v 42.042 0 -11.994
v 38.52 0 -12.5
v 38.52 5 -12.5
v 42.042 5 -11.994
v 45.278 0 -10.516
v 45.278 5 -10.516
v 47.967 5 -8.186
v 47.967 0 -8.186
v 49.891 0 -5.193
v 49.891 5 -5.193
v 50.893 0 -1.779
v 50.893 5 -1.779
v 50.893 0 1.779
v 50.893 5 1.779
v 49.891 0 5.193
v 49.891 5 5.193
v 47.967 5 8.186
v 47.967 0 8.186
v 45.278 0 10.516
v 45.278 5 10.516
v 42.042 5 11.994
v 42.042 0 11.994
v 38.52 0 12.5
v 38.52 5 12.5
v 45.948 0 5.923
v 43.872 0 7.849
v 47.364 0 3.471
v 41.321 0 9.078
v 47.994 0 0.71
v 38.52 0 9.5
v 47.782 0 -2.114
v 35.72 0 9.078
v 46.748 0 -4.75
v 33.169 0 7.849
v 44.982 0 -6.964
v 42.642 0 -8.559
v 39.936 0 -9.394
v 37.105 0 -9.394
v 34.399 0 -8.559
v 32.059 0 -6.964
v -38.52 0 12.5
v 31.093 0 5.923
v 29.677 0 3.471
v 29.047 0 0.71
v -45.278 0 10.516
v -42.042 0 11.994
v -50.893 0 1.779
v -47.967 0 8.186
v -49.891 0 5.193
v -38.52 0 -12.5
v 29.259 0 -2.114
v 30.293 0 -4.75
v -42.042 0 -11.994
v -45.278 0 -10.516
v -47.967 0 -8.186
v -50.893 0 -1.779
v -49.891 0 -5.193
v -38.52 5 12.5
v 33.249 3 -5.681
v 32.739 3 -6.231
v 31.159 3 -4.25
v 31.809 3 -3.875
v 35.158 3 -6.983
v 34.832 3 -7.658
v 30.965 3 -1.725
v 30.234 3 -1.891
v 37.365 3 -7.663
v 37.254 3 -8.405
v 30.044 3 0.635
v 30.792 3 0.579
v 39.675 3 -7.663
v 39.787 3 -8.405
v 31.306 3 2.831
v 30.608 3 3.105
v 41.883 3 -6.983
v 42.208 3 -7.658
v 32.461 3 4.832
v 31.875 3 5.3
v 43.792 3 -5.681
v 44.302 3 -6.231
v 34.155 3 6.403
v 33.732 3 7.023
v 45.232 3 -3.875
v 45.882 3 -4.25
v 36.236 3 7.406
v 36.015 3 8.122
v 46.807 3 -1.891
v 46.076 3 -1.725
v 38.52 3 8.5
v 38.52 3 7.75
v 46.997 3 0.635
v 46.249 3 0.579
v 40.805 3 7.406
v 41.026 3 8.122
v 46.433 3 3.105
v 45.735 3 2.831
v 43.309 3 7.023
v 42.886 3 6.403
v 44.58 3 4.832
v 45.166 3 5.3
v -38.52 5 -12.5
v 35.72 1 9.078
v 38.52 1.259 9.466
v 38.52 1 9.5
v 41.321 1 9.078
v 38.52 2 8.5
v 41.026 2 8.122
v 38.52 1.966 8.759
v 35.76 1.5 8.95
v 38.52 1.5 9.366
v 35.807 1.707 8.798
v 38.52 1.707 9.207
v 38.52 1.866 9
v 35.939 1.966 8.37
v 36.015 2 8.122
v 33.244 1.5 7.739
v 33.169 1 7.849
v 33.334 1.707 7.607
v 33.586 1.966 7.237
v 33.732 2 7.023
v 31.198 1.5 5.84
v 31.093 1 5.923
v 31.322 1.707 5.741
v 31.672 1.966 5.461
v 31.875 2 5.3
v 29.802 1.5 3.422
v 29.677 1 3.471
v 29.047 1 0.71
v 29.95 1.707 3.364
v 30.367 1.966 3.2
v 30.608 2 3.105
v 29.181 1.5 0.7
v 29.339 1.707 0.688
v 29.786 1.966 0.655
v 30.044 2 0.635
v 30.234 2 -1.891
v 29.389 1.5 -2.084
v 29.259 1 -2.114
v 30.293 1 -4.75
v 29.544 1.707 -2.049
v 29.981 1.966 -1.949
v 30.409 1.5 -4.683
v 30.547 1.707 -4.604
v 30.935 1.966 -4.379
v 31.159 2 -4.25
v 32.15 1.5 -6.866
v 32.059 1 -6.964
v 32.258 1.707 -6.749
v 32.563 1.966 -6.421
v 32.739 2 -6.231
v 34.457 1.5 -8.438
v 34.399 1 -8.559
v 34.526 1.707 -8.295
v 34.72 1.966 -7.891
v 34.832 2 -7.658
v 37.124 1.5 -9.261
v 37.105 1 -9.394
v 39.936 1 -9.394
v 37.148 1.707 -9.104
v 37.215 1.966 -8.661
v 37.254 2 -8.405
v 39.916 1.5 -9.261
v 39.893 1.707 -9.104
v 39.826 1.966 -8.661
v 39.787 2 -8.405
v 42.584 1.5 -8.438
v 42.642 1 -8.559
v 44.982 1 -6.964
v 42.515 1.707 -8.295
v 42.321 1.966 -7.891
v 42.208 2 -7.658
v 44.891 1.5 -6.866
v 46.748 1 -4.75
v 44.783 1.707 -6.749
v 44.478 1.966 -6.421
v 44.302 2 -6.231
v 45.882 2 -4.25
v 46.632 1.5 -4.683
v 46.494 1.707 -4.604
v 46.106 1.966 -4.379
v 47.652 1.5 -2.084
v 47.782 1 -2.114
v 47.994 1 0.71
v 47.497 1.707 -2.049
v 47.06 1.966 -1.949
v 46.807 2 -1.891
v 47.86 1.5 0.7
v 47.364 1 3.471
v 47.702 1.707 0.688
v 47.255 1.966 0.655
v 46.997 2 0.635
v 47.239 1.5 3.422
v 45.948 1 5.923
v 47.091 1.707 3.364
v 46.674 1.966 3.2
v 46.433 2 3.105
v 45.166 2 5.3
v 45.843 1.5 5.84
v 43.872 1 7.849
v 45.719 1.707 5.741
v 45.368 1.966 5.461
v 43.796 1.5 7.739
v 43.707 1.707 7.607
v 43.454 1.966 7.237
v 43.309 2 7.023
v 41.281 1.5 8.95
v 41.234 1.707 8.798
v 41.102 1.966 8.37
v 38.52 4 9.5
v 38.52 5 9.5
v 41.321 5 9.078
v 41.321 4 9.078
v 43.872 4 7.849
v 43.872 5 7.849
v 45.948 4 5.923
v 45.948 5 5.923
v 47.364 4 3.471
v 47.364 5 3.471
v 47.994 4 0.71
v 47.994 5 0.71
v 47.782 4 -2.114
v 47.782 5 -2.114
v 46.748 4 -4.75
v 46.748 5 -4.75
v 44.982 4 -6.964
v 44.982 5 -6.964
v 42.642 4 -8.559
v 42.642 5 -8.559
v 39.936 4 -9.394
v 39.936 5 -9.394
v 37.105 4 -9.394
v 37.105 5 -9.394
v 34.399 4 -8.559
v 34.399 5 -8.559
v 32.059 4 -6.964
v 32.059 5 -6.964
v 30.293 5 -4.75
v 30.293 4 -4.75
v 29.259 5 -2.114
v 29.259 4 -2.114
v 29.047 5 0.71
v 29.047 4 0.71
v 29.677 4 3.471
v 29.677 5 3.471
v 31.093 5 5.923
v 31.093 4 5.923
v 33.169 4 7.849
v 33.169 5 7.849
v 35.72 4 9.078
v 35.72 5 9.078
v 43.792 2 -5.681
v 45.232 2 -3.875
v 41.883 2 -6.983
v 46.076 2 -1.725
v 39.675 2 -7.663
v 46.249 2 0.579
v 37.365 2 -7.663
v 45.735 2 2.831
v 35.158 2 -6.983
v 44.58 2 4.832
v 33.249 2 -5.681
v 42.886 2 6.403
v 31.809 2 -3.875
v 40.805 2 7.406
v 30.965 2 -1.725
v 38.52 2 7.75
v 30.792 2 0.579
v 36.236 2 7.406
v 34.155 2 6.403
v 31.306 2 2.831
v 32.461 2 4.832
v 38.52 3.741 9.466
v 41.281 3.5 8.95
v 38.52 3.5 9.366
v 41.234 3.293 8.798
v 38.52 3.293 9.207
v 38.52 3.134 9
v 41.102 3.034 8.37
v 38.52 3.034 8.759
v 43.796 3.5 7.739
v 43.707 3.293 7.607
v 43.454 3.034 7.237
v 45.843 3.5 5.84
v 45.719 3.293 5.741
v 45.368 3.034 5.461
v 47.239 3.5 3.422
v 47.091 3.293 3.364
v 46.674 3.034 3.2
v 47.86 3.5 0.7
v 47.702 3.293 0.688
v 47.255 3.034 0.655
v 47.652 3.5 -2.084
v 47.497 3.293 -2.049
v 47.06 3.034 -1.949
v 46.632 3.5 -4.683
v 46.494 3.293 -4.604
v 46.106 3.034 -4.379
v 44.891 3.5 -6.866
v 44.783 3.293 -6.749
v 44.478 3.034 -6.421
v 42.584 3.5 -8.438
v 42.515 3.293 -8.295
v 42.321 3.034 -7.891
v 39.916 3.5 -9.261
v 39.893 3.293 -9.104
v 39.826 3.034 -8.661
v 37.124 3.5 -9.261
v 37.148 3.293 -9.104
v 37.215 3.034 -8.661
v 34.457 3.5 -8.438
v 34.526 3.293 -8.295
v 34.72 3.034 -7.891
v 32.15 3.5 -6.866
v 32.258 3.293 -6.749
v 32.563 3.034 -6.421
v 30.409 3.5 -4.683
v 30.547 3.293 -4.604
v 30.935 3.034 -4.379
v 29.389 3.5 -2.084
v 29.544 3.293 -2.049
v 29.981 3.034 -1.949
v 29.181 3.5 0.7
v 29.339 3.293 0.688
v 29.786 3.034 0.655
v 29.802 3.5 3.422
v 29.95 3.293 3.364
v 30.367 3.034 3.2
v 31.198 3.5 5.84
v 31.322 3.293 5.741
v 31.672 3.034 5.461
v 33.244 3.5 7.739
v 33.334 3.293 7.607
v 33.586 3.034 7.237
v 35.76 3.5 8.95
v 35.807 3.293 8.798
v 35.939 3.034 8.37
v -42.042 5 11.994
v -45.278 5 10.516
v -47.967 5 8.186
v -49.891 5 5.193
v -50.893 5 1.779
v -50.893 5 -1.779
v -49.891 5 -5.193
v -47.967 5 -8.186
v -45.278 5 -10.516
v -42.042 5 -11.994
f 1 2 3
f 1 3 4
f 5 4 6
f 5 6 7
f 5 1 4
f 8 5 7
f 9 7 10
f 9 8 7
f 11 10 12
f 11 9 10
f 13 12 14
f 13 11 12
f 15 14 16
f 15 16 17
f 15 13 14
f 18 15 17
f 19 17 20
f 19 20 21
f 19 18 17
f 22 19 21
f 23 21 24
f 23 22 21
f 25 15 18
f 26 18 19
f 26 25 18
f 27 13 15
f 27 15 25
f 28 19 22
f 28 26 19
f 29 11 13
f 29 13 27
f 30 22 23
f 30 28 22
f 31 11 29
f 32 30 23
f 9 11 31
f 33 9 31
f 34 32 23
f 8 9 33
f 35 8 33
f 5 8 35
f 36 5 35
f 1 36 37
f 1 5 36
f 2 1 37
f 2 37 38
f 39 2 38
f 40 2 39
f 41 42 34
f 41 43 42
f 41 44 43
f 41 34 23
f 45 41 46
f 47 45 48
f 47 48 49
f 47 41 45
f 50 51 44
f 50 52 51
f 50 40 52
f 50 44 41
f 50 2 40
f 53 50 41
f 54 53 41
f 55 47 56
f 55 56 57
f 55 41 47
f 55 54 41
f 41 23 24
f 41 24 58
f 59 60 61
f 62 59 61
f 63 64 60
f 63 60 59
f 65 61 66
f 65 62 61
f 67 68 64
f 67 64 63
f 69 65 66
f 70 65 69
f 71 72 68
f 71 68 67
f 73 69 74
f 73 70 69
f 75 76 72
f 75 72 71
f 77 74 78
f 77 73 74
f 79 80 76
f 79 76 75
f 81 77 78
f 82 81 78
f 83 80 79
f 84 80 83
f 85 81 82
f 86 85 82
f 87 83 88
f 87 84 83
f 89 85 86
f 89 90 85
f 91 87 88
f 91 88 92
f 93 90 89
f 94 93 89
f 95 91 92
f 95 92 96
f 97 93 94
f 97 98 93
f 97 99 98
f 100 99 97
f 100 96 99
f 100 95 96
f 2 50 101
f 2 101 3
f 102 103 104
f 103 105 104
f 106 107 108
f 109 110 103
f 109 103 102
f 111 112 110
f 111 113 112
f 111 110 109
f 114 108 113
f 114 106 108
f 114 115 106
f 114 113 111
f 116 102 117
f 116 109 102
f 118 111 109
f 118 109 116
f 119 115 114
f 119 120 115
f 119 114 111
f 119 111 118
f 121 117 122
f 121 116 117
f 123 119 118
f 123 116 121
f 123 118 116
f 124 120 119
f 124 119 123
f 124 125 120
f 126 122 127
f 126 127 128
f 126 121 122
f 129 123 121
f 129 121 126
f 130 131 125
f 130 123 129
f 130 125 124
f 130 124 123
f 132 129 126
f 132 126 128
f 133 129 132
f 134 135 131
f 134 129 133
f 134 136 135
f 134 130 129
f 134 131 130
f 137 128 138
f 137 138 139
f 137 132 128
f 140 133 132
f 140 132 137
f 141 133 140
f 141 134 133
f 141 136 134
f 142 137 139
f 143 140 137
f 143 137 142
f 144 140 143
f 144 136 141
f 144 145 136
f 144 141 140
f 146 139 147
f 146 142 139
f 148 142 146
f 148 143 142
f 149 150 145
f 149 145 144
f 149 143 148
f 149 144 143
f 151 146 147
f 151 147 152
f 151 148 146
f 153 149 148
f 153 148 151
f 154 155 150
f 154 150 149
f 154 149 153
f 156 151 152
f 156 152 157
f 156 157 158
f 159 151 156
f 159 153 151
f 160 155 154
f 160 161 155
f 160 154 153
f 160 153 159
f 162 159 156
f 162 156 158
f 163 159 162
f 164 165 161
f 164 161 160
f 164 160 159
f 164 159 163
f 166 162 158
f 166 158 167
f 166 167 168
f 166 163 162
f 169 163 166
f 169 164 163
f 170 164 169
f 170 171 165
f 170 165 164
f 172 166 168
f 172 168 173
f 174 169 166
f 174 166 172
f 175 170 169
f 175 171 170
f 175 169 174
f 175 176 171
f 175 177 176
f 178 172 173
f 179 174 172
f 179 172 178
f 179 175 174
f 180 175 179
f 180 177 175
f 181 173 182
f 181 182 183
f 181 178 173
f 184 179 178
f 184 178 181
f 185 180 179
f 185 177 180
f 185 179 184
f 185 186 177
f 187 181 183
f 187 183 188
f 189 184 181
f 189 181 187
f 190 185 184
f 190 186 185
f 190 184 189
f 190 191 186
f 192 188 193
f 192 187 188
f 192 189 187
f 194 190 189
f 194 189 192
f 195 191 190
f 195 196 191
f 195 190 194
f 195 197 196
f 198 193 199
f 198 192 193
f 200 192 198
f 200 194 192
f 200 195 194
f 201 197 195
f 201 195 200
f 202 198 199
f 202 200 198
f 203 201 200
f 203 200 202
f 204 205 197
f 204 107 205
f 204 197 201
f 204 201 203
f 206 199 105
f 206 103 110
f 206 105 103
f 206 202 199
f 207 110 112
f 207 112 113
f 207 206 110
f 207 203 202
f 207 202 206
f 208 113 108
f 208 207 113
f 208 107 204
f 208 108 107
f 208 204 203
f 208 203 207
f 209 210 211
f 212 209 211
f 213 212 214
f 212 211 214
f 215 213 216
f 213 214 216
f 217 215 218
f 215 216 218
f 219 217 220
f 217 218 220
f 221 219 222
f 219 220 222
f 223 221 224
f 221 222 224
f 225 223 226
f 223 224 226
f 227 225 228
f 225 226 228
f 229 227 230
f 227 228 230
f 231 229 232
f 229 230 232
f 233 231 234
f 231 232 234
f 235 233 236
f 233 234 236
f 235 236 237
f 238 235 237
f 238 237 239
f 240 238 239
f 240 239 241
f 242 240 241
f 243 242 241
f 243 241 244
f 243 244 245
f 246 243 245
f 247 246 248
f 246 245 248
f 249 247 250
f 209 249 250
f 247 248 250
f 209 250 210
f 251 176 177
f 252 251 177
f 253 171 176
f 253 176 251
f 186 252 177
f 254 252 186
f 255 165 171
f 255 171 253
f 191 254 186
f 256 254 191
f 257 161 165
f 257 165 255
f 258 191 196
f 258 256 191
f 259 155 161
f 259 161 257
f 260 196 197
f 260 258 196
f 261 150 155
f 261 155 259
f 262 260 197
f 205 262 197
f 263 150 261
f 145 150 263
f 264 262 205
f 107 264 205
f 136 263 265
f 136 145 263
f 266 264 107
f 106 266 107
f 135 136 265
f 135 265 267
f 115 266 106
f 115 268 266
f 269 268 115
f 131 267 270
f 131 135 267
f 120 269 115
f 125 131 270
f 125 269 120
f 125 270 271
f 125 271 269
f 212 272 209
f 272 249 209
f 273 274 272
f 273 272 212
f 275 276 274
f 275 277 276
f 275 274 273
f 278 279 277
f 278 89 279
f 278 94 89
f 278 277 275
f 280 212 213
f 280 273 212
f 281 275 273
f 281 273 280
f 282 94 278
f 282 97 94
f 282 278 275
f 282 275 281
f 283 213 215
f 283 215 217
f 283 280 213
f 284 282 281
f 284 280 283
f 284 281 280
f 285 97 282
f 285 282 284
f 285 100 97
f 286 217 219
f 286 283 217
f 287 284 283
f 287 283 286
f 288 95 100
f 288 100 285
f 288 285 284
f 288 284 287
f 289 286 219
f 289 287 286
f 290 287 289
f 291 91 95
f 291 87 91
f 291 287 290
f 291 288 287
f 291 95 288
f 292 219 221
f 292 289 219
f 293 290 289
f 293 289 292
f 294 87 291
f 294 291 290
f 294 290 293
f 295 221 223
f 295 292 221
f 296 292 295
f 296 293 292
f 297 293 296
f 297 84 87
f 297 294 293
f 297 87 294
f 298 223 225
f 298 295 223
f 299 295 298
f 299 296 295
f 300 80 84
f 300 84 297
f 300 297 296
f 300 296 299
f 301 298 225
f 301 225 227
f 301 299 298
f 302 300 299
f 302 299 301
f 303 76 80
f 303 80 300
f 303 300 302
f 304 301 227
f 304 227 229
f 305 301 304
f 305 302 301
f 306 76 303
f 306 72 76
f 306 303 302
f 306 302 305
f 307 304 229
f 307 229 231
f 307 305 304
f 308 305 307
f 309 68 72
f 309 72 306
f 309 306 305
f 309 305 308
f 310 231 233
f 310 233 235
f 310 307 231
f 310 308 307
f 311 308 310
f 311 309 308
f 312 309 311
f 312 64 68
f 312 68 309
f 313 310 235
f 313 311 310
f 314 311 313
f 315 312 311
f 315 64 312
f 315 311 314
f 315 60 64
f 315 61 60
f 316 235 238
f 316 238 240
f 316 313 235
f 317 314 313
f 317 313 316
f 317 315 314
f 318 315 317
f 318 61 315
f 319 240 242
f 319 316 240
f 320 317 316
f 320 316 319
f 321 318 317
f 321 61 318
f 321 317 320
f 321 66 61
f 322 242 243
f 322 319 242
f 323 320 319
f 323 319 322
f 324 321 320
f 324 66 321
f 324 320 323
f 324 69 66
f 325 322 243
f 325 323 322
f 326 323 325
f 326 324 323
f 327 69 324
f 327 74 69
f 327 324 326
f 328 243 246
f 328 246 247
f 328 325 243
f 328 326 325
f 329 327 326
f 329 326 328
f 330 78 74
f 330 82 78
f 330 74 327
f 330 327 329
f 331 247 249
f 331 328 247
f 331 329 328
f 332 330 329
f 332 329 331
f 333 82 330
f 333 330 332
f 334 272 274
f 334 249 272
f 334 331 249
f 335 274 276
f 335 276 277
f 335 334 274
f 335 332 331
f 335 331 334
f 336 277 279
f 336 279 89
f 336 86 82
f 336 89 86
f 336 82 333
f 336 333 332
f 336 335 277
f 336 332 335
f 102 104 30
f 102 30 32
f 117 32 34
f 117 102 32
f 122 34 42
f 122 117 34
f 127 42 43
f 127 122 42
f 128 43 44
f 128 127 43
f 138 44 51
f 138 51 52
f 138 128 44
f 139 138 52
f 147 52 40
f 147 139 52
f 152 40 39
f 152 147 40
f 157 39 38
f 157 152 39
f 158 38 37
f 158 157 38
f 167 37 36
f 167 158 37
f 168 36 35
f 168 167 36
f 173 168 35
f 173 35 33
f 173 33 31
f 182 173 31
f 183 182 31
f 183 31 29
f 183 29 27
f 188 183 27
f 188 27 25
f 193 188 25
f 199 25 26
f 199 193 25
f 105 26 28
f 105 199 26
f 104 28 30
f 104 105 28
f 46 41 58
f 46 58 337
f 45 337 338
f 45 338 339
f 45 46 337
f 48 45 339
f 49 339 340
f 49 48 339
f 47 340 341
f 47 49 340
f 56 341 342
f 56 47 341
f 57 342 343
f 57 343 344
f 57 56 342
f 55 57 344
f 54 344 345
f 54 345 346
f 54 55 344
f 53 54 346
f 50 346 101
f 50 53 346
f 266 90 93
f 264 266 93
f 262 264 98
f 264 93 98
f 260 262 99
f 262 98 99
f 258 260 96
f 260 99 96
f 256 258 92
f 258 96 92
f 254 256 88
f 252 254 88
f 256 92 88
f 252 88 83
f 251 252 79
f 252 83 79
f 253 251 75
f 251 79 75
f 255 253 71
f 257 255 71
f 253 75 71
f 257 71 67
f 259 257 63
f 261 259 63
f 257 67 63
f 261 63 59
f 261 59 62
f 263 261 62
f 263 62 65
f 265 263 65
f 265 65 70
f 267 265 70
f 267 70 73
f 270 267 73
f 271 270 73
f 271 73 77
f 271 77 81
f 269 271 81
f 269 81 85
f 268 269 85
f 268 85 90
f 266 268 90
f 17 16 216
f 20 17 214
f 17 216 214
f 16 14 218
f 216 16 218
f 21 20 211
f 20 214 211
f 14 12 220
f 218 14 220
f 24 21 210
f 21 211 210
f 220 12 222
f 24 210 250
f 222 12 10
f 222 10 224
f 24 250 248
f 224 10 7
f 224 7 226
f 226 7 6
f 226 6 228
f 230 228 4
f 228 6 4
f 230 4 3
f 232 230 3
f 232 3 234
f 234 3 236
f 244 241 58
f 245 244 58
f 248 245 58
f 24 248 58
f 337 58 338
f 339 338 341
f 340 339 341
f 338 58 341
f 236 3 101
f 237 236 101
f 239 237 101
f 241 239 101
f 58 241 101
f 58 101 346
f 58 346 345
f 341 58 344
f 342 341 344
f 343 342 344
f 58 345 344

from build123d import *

# Parameters (mm, degrees)
EXTRUDE_1_DEPTH     = 5
CUT_EXTRUDE_1_REACH = 54.767
SKETCH_2_R          = 7.75
SKETCH_3_R          = 9.5
CUT_EXTRUDE_2_DEPTH = 2
CUT_EXTRUDE_START   = -2
SKETCH_4_R          = 9.5
CUT_EXTRUDE_3_DEPTH = 2
FILLET_1_R          = 1


with BuildPart() as part:
    # 草图1 → 凸台-拉伸1 (new body)
    with BuildSketch(Plane(origin=(0, 0, 0), x_dir=(1, 0, 0), z_dir=(0, 1, 0))):
        with BuildLine():
            Line((-38.520408163, 12.5), (38.520408163, 12.5))
            ThreePointArc((38.520408163, 12.5), (51.020408163, 0), (38.520408163, -12.5))
            Line((38.520408163, -12.5), (-38.520408163, -12.5))
            ThreePointArc((-38.520408163, -12.5), (-51.020408163, 0), (-38.520408163, 12.5))
        make_face()
    extrude(amount=EXTRUDE_1_DEPTH)

    # 草图2 → 切除-拉伸1 (cut, up to next)
    with BuildSketch(Plane(origin=(0, 5, 0), x_dir=(1, 0, 0), z_dir=(0, 1, 0)), mode=Mode.PRIVATE) as cut_extrude_1_sk1:
        with Locations(Location((38.520408163, 0, 0), (0, 0, 270))):
            Circle(SKETCH_2_R)
    cut_extrude_1_tool1 = extrude(cut_extrude_1_sk1.sketch, amount=-CUT_EXTRUDE_1_REACH, mode=Mode.PRIVATE) & part.part
    add(cut_extrude_1_tool1.solids().sort_by_distance((38.520408, 5, 0))[0], mode=Mode.SUBTRACT)

    # 草图3 → 切除-拉伸2 (cut)
    with BuildSketch(Plane(origin=(0, 5, 0), x_dir=(1, 0, 0), z_dir=(0, 1, 0))):
        with Locations(Location((38.520408163, 0, 0), (0, 0, 270))):
            Circle(SKETCH_3_R)
    extrude(amount=-CUT_EXTRUDE_2_DEPTH, mode=Mode.SUBTRACT)

    # 草图4 → 切除-拉伸3 (cut)
    with BuildSketch(Plane.XZ.offset(CUT_EXTRUDE_START)):
        with Locations(Location((38.520408163, 0, 0), (0, 0, 90))):
            Circle(SKETCH_4_R)
    extrude(amount=CUT_EXTRUDE_3_DEPTH, mode=Mode.SUBTRACT)

    # 圆角1
    fillet_1_edges = [part.edges().sort_by_distance(p)[0] for p in [
        (38.520408163, 3, -9.5),
        (38.520408163, 2, -9.5),
    ]]
    fillet(fillet_1_edges, radius=FILLET_1_R)


solid = part.part
